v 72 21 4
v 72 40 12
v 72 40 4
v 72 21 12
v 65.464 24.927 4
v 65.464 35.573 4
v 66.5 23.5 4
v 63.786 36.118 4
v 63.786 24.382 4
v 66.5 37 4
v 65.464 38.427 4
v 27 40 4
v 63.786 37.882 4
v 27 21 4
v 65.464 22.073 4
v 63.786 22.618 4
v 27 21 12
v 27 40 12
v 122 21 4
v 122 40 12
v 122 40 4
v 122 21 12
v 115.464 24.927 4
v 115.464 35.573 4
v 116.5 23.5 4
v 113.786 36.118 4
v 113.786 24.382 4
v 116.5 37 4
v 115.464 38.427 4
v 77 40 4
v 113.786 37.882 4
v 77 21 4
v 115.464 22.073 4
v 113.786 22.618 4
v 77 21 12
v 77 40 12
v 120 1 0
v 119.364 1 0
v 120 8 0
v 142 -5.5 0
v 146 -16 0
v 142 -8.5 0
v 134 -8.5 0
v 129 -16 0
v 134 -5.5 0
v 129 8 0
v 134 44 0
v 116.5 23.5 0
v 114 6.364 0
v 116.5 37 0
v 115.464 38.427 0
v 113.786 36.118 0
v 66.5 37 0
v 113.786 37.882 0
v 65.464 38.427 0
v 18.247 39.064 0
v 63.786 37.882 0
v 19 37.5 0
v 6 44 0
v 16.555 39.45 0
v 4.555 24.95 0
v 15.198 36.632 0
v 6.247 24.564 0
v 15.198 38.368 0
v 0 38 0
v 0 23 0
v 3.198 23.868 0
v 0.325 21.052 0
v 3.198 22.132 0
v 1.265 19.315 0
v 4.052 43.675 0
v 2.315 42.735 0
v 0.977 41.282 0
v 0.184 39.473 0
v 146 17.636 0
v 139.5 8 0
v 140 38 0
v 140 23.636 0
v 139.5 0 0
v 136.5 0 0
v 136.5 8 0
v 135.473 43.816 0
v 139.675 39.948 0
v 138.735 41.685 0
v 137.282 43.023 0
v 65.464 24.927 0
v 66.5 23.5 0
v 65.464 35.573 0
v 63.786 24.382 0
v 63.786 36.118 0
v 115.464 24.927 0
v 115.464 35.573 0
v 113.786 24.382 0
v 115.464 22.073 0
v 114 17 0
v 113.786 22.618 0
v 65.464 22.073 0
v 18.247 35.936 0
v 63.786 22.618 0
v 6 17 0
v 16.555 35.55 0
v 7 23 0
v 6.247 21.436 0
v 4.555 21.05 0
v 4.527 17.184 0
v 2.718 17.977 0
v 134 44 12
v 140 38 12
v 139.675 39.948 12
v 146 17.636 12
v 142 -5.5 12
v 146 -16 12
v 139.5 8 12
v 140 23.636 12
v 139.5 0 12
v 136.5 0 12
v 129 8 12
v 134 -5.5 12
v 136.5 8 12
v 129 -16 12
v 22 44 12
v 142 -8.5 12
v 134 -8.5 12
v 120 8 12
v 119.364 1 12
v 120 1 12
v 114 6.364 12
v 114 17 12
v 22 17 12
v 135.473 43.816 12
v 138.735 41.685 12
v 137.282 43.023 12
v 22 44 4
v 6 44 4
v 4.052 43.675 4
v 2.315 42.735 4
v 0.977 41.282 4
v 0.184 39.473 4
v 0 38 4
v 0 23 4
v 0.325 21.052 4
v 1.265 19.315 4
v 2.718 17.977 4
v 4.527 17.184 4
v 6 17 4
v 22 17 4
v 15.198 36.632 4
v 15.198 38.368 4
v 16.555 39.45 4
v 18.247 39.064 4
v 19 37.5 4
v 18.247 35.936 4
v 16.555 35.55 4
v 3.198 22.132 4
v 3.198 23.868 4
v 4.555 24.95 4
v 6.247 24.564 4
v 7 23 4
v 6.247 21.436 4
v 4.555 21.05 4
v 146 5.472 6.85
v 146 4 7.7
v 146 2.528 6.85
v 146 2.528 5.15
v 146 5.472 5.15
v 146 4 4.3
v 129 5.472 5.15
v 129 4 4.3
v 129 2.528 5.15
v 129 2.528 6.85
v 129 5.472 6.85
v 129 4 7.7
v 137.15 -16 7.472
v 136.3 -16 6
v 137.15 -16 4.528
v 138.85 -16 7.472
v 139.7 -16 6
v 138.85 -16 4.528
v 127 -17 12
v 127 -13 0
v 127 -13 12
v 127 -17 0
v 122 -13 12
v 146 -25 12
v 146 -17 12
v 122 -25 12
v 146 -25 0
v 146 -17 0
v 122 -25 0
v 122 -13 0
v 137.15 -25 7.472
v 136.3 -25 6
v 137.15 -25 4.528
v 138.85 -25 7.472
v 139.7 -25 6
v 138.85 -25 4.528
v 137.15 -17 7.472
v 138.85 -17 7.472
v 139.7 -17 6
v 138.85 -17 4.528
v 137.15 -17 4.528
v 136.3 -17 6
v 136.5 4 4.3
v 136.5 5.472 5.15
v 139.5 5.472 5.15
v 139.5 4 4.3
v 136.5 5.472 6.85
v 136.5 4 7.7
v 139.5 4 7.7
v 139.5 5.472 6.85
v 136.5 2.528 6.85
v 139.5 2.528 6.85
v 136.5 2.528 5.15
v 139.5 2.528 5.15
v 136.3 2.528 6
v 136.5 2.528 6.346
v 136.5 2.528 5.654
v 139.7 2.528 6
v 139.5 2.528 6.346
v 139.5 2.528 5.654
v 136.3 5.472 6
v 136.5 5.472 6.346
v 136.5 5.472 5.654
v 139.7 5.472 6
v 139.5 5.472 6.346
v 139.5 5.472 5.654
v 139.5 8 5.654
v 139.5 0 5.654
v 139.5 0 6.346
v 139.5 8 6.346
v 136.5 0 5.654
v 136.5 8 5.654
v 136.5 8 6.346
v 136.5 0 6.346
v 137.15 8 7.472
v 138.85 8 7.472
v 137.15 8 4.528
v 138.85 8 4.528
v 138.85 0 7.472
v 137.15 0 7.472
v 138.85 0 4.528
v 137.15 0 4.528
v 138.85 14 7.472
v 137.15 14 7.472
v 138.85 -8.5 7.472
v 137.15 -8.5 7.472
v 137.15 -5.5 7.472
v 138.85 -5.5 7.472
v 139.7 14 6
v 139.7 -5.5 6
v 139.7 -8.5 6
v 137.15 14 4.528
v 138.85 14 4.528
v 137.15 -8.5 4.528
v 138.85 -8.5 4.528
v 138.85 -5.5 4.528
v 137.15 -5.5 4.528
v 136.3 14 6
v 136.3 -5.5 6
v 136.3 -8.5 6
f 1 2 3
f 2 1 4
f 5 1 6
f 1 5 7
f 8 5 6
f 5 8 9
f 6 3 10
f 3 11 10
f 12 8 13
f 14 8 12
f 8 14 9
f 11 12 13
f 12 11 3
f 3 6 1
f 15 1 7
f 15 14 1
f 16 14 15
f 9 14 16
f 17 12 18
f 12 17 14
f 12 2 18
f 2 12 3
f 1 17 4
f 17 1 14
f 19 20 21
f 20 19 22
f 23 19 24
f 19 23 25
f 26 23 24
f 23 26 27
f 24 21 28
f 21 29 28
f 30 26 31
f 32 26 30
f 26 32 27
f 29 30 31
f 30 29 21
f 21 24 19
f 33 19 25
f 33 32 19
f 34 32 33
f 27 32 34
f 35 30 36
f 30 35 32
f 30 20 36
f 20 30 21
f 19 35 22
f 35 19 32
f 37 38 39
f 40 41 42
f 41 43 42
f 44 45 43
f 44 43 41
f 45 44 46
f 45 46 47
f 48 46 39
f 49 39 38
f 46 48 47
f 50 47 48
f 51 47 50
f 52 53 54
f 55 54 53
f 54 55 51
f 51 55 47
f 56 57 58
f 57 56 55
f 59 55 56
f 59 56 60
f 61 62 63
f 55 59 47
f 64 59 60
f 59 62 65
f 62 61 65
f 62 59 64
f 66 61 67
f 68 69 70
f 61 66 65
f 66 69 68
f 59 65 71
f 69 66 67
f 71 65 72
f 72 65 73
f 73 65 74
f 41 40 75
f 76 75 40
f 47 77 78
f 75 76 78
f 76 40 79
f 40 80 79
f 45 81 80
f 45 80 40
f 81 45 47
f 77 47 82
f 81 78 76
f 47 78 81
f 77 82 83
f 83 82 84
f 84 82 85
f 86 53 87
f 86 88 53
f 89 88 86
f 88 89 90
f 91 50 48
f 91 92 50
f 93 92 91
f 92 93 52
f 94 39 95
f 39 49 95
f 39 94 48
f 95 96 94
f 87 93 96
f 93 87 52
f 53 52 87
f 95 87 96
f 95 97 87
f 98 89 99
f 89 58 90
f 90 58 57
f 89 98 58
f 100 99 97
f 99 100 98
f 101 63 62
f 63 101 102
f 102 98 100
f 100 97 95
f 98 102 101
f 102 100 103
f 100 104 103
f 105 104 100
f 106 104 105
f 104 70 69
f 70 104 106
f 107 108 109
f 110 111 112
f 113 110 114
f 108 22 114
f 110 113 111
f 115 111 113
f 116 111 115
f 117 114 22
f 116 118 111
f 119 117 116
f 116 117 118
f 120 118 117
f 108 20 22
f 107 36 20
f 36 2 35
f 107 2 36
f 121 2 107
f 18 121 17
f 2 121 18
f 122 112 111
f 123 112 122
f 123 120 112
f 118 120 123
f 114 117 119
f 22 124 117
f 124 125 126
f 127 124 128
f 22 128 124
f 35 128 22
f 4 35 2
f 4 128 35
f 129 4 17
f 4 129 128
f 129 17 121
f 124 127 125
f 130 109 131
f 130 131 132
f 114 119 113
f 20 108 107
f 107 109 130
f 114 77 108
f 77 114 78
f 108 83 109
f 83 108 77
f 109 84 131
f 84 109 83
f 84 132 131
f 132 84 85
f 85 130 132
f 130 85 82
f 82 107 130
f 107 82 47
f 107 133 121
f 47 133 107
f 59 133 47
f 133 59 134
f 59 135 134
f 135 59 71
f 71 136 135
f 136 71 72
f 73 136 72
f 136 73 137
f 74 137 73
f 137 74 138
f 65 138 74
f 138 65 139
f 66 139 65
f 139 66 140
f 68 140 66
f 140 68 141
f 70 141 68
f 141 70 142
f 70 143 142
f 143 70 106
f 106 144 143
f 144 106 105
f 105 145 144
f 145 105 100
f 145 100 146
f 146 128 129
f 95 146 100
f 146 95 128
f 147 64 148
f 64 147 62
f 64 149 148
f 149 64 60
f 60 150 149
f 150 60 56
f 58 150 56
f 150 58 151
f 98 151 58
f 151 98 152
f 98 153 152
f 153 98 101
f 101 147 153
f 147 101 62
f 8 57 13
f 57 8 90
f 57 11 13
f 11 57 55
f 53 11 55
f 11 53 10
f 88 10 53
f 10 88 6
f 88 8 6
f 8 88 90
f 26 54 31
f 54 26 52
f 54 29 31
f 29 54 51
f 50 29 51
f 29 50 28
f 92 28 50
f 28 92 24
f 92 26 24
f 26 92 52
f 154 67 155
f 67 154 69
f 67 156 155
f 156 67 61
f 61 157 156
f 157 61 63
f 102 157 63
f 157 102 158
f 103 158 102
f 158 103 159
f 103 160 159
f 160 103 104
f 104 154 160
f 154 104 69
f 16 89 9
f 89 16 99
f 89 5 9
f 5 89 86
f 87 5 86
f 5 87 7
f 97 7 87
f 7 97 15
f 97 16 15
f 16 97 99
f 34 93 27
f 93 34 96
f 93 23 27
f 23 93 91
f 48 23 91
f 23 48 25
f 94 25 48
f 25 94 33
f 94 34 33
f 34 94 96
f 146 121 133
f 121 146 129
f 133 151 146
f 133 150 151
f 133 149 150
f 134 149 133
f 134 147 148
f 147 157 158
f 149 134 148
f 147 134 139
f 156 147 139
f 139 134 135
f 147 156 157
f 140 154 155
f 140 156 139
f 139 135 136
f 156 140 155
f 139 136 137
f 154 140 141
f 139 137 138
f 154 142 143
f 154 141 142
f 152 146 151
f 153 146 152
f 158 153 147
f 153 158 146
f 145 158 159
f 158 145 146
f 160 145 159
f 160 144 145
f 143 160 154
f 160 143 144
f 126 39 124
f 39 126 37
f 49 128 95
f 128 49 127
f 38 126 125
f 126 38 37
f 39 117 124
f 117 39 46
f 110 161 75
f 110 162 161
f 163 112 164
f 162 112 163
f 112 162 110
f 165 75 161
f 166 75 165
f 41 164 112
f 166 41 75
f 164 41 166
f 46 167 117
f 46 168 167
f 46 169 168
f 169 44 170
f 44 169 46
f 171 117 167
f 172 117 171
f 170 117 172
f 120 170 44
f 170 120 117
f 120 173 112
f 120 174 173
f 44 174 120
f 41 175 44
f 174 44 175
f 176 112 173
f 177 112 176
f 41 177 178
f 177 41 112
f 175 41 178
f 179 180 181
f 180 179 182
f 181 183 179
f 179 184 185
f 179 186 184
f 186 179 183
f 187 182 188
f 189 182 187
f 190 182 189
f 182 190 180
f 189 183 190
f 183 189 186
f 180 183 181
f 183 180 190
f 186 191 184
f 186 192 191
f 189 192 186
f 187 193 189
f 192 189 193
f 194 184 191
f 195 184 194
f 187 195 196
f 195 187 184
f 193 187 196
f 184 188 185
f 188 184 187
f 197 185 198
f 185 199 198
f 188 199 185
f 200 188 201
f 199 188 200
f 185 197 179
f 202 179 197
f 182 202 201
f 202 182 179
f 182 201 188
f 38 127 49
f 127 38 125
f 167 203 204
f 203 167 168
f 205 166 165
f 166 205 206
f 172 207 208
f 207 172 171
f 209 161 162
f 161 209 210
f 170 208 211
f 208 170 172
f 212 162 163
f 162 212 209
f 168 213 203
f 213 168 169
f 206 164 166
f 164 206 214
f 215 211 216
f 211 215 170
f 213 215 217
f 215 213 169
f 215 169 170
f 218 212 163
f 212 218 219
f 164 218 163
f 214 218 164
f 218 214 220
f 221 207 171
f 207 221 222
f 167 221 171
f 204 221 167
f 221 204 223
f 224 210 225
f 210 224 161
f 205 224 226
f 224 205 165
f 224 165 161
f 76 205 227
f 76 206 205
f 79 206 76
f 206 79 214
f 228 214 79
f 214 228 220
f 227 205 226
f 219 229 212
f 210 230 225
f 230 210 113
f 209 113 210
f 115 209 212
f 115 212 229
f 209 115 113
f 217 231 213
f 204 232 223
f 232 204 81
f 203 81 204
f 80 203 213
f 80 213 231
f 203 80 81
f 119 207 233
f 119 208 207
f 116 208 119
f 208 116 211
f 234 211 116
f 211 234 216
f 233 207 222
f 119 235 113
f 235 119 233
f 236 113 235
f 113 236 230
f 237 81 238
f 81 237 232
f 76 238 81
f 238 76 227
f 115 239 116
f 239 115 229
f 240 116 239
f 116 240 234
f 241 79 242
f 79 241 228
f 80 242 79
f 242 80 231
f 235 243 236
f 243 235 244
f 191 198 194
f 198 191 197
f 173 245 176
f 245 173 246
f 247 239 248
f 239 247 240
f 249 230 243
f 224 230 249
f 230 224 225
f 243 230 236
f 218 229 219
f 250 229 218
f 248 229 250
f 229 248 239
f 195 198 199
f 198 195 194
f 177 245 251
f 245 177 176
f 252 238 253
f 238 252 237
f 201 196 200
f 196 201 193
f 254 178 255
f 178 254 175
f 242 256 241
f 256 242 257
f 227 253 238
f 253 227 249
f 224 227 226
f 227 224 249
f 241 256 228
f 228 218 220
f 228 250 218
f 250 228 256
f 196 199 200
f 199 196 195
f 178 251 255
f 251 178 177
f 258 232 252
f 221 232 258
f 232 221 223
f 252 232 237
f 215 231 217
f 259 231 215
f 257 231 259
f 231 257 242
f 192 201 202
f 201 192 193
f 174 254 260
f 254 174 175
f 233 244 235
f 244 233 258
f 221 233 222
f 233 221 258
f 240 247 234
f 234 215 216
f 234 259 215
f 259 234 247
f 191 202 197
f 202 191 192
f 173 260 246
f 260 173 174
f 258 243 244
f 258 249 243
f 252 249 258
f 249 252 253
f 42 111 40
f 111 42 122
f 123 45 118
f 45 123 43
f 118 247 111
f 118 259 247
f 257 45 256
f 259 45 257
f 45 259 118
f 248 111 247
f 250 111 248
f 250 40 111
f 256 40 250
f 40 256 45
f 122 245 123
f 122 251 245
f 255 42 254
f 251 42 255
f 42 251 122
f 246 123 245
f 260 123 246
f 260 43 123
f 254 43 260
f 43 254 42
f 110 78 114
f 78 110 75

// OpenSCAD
// file: beaters.scad
/*
  MIDI Driven Drumbot
  ©2024 Crunchysteve
  ----------------------
  This code will be the MIDI driven heart of SoléBot, the solenoid driven drumbot. 

  Dynamics are provided by using analogWrite() on channels that need them, or digitalWrite() for 
  the channels that don't, with a timed pulse to kick 12v solenoids with 24v for just long enough 
  to never exceed 24W RMS applied to each solenoid, even at maximum tempo. The MIDI note number 
  corresponding to each drum will determine which solenoid operates, while MIDI velocity + 127 
  applied to analogWrite() on the PWM outputs will generate soft to loud hits.

  This code will run on almost any micro, but the pins are setup for an Arduino Uno or Nano. 
  Use a dual AOD4184 MOSFET module, such as this one, 
    https://core-electronics.com.au/mosfet-power-switch-module.html, to drive each solenoid.

  I'm using JF-0826B 12v/2A 20N solenoids and, because of the light duty cycle, I run them from
  24V via the MOSFET boards. I haven't tried higher than 30v yet, but neither Solenoids nor the 
  MOSFETS run hot at 30v, even when run for extended periods. Non-blocking timing will be used to 
  pulse PWM drive just long enough to get the beater within a millimetre of the drum skin.
  
  All code, including C code and the OpenSCAD bracket 3D files, are hosted on
    https://github.com/crunchysteve/Solebot while,
  the OpenSCAD models are also hosted here 
    https://www.thingiverse.com/thing:6771931 without without C code.
  
  This code is copyright ©2024 Crunchysteve and is available for use or modification under an MIT 
  licence, except for commercial use, whereupon the author would appreciate a percentage of device 
  sales in exchange for any licence for manufacturing this project commercially.

  This preamble must always remain at the head of all 3d models and source code.
*/

translate([0,21,0]) stickTip();
kickBeater();

module kickBeater() difference(){
    $fn=60;
    union(){
        cylinder(r=16,h=10);
        translate([0,0,10]) scale([1,1,0.33]) sphere(16);
    }
    translate([0,0,-1]) cylinder(r=1.5,h=5);
}

module stickTip() difference(){
    $fn=60;
    translate([0,0,3]) scale([2,1,1]) sphere(4);
    translate([0,0,-2]) cylinder(r=8,h=2);
    rotate([0,10,0]) translate([0,0,-2]) cylinder(r=1.5,h=6);
}
// file: solenoid.scad
solenoid();

module solenoid(pos=false,type="JF0826B",_echo=false){
    position = pos ? 1 : 0;
    if(type=="JF0826B"){
        location = 12 - position * 10;
        color("silver") 
        difference(){
            cube([22,25,27]);
            translate([-1,2,2]) cube([24,21,22]);
            translate([4,-1,26]) cube([14,27,2]);
            translate([-1,2,26]) cube([24,21,2]);
            translate([11,12.5,-1]) cylinder(r=2,h=4);
            translate([11,12.5,3]) cylinder(r=4,h=27);
            translate([5,12.5,20.5]) 
                    rotate([-90,0,0]) cylinder(r=1.5,h=15);
            translate([17,12.5,6]) 
                    rotate([-90,0,0]) cylinder(r=1.5,h=15);
        }
        color("blue") translate([11,12.5,2]) difference(){
            cylinder(r=11,h=22);
            translate([0,0,-1]) cylinder(r=4,h=29);
        }
        color("silver") translate([11,12.5,location]) difference(){
        union(){
                cylinder(r=3.75,h=35);
                translate([0,0,26]) cylinder(r=6,h=1);
                translate([0,0,-15]) cylinder(r=1.7,h=16);
                translate([0,0,-15]) cylinder(r=3,h=3);
                translate([0,0,-15]) sphere(3);
            }
            translate([-5,-1.2,28]) cube([10,2.4,10]);
            translate([0,5,31]) rotate([90,0,0]) cylinder(r=1.25,h=10);
        }
        if(_echo){
            echo("position",position);
            echo("type",type);
            echo("throw (mm)",10);
            echo("width (Xmm)",22);
            echo("depth (Ymm)",25);
            echo("height (Zmm)",27);
            echo("HOA (Zmm, nut to top of shaft)",55);
            echo("mount holes (Dmm)",3);
            echo("mount apacing (XxZmm)",
                 "12x12 at...\n\t5 from vertical edge,\n\t6 from bottom edge.");
        }
    }
}
// main file
/*
  MIDI Driven Drumbot
  ©2024 Crunchysteve
  ----------------------
  This code will be the MIDI driven heart of SoléBot, the solenoid driven drumbot. 

  Dynamics are provided by using analogWrite() on channels that need them, or digitalWrite() for 
  the channels that don't, with a timed pulse to kick 12v solenoids with 24v for just long enough 
  to never exceed 24W RMS applied to each solenoid, even at maximum tempo. The MIDI note number 
  corresponding to each drum will determine which solenoid operates, while MIDI velocity + 127 
  applied to analogWrite() on the PWM outputs will generate soft to loud hits.

  This code will run on almost any micro, but the pins are setup for an Arduino Uno or Nano. 
  Use a dual AOD4184 MOSFET module, such as this one, 
    https://core-electronics.com.au/mosfet-power-switch-module.html, to drive each solenoid.

  I'm using JF-0826B 12v/2A 20N solenoids and, because of the light duty cycle, I run them from
  24V via the MOSFET boards. I haven't tried higher than 30v yet, but neither Solenoids nor the 
  MOSFETS run hot at 30v, even when run for extended periods. Non-blocking timing will be used to 
  pulse PWM drive just long enough to get the beater within a millimetre of the drum skin.
  
  All code, including C code and the OpenSCAD bracket 3D files, are hosted on
    https://github.com/crunchysteve/Solebot while,
  the OpenSCAD models are also hosted here 
    https://www.thingiverse.com/thing:6771931 without without C code.
  
  This code is copyright ©2024 Crunchysteve and is available for use or modification under an MIT 
  licence, except for commercial use, whereupon the author would appreciate a percentage of device 
  sales in exchange for any licence for manufacturing this project commercially.

  This preamble must always remain at the head of all 3d models and source code.
*/

use <solenoid.scad>
use <beaters.scad>

arm();
//translate([0,17,4]) snareSolenoid();

module arm(){
    translate([0,17]) difference(){
        linear_extrude(height=12) difference(){
            offset(6) offset(-6)square([140,27]);
            translate([17,20.5]) circle(2);
            translate([5,6]) circle(2);
            for(x=[65,115]) for(y=[6.5,20]) 
                    translate([x,y]) circle(1.5);
        }
        translate([-1,-1,4]) cube([23,29,9]);
        for(x=[27,77]) translate([x,4,4]) cube([45,19,9]);
    }
    difference(){
        union(){
            translate([114,1,0]) cube([6,17,12]);
            translate([120,8,0]) cube([10,12,12]);
            translate([129,-16,0]) cube([17,40,12]);
            translate([122,-25,0]) cube([5,12,12]);
            translate([124,-25,0]) cube([22,8,12]);
        }
        translate([113,1,4]) 
                rotate([0,0,45]) cube([9,9,146],center=true);
        translate([121,4,6]) rotate([0,90,0]) cylinder(r=1.7,h=40);
        translate([138,4,6]) cube([3,8,16],center=true);
        translate([138,-26,6]) rotate([-90,0,0]) cylinder(r=1.7,h=40);
        translate([138,-7,6]) cube([8,3,16],center=true);
        translate([146,24,6]) 
                rotate([0,0,45]) cube([9,9,146],center=true);
    }
}

module snareSolenoid(state=false) translate([0,0,25]) rotate([-90,0,0]){
    value = state ? -11 : -4;
    solenoid();
    translate([11,12.5,value]) mirror([0,0,1]) rotate([0,-10,0]) stickTip();
}
